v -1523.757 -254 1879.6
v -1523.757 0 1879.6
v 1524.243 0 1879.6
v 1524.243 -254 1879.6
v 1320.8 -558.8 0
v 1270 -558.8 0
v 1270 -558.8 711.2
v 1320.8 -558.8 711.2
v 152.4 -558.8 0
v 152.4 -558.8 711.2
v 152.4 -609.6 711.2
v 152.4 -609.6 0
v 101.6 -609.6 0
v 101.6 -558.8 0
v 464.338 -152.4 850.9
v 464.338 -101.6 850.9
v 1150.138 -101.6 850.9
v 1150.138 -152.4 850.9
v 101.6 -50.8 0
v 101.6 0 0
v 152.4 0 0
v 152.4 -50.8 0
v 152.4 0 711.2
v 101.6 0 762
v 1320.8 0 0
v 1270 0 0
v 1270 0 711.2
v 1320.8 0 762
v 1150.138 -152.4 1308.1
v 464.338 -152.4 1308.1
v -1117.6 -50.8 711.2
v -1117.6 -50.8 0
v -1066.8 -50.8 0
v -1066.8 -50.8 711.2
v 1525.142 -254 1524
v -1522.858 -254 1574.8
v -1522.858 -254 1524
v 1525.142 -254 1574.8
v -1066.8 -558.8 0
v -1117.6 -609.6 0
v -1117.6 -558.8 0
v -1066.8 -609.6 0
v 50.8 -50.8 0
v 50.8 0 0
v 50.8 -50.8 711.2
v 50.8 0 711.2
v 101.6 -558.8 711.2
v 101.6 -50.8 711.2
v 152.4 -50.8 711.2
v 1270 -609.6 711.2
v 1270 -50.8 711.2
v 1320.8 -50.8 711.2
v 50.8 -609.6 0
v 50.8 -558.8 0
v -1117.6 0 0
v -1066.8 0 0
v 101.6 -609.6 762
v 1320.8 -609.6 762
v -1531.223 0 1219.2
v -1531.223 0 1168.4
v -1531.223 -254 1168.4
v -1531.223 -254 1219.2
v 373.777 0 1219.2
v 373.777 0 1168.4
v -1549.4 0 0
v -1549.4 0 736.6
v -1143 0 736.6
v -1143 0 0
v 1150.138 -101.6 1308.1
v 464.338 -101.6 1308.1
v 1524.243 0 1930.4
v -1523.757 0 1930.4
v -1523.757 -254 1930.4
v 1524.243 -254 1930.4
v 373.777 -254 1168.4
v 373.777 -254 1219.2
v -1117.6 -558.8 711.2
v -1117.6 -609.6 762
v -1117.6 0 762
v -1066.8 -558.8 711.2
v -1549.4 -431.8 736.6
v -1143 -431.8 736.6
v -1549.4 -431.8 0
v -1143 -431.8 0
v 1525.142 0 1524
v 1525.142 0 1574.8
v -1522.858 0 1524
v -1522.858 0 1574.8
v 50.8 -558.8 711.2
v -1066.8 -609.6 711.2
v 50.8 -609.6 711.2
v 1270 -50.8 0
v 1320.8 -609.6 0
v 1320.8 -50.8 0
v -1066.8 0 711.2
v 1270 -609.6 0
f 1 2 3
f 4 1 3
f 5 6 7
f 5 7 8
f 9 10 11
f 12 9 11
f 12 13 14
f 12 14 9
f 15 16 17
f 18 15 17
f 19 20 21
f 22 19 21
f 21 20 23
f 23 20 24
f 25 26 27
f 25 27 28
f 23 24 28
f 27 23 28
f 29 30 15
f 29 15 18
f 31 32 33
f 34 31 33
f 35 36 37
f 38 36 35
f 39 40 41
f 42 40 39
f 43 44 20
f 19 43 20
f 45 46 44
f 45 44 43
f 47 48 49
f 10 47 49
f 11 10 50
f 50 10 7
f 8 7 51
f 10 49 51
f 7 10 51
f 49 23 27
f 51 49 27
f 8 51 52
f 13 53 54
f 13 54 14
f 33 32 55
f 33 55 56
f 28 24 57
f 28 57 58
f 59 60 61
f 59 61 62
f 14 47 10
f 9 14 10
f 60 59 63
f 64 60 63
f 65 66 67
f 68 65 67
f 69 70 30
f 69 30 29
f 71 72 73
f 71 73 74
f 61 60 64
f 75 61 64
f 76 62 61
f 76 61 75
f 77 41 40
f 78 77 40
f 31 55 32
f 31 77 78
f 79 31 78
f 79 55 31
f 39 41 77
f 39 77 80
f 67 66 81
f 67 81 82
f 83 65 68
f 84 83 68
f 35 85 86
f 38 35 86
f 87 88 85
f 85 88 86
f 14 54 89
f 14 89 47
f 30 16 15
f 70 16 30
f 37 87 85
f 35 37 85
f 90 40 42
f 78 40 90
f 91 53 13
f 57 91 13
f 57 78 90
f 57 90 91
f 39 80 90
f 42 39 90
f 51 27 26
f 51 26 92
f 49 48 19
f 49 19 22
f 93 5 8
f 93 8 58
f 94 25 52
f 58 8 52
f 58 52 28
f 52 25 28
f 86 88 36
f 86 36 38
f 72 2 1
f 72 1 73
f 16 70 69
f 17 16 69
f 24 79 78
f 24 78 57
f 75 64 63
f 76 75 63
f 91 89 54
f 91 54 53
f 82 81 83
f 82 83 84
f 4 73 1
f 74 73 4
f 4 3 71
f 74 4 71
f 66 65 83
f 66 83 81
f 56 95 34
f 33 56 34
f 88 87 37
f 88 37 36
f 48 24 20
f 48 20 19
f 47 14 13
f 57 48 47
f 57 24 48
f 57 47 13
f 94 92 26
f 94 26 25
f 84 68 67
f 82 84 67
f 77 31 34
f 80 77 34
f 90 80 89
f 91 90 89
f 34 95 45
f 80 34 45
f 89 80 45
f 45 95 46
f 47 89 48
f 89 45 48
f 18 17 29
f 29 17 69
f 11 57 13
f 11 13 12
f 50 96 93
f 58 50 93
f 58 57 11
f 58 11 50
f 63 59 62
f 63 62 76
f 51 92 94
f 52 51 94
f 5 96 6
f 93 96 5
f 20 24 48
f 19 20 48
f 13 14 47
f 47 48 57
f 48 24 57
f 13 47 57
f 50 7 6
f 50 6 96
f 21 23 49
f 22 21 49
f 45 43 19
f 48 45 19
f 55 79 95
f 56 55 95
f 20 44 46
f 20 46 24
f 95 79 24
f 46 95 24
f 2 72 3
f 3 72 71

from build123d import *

# Parameters (mm, degrees)
F0_W     = 3048
F0_H     = 50.8
F1_DEPTH = 254
F0_W_2   = 1905
F0_W_3   = 1219.2
F2_DEPTH = 609.6
F3_START = 101.6
F0_W_4   = 685.8
F0_H_2   = 457.2
F3_DEPTH = 50.8
F4_DEPTH = 609.6
F5_W     = 50.8
F5_H     = 50.8
F6_DEPTH = 711.2
F7_DEPTH = 711.2
F0_W_5   = 406.4
F0_H_3   = 736.6
F8_DEPTH = 431.8


with BuildPart() as f1:
    # F0 (on Front) → F1 (new body)
    with BuildSketch(Plane.XZ):
        with Locations((0.2425422668, 1905)):
            Rectangle(F0_W, F0_H)
    extrude(amount=F1_DEPTH)


with BuildPart() as f1b:
    # F0 (on Front) → F1, piece 2 (new body)
    with BuildSketch(Plane.XZ):
        with Locations((1.1422147751, 1549.4)):
            Rectangle(F0_W, F0_H)
    extrude(amount=F1_DEPTH)


with BuildPart() as f1c:
    # F0 (on Front) → F1, piece 3 (new body)
    with BuildSketch(Plane.XZ):
        with Locations((-578.7231035233, 1193.8)):
            Rectangle(F0_W_2, F0_H)
    extrude(amount=F1_DEPTH)


with BuildPart() as f2:
    # F0 (on Front) → F2 (new body)
    with BuildSketch(Plane.XZ):
        with Locations((-508, 736.6)):
            Rectangle(F0_W_3, F0_H)
    extrude(amount=F2_DEPTH)

    # F5 (on face) → F6 (join)
    with BuildSketch(Plane(origin=(0, 0, 711.2), x_dir=(1, 0, 0), z_dir=(0, 0, -1))):
        with Locations((76.2, 584.2)):
            Rectangle(F5_W, F5_H)
        with Locations((-1092.2, 584.2)):
            Rectangle(F5_W, F5_H)
        with Locations((-1092.2, 25.4)):
            Rectangle(F5_W, F5_H)
        with Locations((76.2, 25.4)):
            Rectangle(F5_W, F5_H)
    extrude(amount=F6_DEPTH)


with BuildPart() as f3:
    # F0 (on Front) → F3 (new body)
    with BuildSketch(Plane.XZ.offset(F3_START)):
        with Locations((807.2379013062, 1079.5)):
            Rectangle(F0_W_4, F0_H_2)
    extrude(amount=F3_DEPTH)


with BuildPart() as f4:
    # F0 (on Front) → F4 (new body)
    with BuildSketch(Plane.XZ):
        with Locations((711.2, 736.6)):
            Rectangle(F0_W_3, F0_H)
    extrude(amount=F4_DEPTH)

    # F5 (on face) → F7 (join)
    with BuildSketch(Plane(origin=(0, 0, 711.2), x_dir=(1, 0, 0), z_dir=(0, 0, -1))):
        with Locations((127, 584.2)):
            Rectangle(F5_W, F5_H)
        with Locations((127, 25.4)):
            Rectangle(F5_W, F5_H)
        with Locations((1295.4, 584.2)):
            Rectangle(F5_W, F5_H)
        with Locations((1295.4, 25.4)):
            Rectangle(F5_W, F5_H)
    extrude(amount=F7_DEPTH)


with BuildPart() as f8:
    # F0 (on Front) → F8 (new body)
    with BuildSketch(Plane.XZ):
        with Locations((-1346.2, 368.3)):
            Rectangle(F0_W_5, F0_H_3)
    extrude(amount=F8_DEPTH)


solid = Compound([f1.part, f1b.part, f1c.part, f2.part, f3.part, f4.part, f8.part])
